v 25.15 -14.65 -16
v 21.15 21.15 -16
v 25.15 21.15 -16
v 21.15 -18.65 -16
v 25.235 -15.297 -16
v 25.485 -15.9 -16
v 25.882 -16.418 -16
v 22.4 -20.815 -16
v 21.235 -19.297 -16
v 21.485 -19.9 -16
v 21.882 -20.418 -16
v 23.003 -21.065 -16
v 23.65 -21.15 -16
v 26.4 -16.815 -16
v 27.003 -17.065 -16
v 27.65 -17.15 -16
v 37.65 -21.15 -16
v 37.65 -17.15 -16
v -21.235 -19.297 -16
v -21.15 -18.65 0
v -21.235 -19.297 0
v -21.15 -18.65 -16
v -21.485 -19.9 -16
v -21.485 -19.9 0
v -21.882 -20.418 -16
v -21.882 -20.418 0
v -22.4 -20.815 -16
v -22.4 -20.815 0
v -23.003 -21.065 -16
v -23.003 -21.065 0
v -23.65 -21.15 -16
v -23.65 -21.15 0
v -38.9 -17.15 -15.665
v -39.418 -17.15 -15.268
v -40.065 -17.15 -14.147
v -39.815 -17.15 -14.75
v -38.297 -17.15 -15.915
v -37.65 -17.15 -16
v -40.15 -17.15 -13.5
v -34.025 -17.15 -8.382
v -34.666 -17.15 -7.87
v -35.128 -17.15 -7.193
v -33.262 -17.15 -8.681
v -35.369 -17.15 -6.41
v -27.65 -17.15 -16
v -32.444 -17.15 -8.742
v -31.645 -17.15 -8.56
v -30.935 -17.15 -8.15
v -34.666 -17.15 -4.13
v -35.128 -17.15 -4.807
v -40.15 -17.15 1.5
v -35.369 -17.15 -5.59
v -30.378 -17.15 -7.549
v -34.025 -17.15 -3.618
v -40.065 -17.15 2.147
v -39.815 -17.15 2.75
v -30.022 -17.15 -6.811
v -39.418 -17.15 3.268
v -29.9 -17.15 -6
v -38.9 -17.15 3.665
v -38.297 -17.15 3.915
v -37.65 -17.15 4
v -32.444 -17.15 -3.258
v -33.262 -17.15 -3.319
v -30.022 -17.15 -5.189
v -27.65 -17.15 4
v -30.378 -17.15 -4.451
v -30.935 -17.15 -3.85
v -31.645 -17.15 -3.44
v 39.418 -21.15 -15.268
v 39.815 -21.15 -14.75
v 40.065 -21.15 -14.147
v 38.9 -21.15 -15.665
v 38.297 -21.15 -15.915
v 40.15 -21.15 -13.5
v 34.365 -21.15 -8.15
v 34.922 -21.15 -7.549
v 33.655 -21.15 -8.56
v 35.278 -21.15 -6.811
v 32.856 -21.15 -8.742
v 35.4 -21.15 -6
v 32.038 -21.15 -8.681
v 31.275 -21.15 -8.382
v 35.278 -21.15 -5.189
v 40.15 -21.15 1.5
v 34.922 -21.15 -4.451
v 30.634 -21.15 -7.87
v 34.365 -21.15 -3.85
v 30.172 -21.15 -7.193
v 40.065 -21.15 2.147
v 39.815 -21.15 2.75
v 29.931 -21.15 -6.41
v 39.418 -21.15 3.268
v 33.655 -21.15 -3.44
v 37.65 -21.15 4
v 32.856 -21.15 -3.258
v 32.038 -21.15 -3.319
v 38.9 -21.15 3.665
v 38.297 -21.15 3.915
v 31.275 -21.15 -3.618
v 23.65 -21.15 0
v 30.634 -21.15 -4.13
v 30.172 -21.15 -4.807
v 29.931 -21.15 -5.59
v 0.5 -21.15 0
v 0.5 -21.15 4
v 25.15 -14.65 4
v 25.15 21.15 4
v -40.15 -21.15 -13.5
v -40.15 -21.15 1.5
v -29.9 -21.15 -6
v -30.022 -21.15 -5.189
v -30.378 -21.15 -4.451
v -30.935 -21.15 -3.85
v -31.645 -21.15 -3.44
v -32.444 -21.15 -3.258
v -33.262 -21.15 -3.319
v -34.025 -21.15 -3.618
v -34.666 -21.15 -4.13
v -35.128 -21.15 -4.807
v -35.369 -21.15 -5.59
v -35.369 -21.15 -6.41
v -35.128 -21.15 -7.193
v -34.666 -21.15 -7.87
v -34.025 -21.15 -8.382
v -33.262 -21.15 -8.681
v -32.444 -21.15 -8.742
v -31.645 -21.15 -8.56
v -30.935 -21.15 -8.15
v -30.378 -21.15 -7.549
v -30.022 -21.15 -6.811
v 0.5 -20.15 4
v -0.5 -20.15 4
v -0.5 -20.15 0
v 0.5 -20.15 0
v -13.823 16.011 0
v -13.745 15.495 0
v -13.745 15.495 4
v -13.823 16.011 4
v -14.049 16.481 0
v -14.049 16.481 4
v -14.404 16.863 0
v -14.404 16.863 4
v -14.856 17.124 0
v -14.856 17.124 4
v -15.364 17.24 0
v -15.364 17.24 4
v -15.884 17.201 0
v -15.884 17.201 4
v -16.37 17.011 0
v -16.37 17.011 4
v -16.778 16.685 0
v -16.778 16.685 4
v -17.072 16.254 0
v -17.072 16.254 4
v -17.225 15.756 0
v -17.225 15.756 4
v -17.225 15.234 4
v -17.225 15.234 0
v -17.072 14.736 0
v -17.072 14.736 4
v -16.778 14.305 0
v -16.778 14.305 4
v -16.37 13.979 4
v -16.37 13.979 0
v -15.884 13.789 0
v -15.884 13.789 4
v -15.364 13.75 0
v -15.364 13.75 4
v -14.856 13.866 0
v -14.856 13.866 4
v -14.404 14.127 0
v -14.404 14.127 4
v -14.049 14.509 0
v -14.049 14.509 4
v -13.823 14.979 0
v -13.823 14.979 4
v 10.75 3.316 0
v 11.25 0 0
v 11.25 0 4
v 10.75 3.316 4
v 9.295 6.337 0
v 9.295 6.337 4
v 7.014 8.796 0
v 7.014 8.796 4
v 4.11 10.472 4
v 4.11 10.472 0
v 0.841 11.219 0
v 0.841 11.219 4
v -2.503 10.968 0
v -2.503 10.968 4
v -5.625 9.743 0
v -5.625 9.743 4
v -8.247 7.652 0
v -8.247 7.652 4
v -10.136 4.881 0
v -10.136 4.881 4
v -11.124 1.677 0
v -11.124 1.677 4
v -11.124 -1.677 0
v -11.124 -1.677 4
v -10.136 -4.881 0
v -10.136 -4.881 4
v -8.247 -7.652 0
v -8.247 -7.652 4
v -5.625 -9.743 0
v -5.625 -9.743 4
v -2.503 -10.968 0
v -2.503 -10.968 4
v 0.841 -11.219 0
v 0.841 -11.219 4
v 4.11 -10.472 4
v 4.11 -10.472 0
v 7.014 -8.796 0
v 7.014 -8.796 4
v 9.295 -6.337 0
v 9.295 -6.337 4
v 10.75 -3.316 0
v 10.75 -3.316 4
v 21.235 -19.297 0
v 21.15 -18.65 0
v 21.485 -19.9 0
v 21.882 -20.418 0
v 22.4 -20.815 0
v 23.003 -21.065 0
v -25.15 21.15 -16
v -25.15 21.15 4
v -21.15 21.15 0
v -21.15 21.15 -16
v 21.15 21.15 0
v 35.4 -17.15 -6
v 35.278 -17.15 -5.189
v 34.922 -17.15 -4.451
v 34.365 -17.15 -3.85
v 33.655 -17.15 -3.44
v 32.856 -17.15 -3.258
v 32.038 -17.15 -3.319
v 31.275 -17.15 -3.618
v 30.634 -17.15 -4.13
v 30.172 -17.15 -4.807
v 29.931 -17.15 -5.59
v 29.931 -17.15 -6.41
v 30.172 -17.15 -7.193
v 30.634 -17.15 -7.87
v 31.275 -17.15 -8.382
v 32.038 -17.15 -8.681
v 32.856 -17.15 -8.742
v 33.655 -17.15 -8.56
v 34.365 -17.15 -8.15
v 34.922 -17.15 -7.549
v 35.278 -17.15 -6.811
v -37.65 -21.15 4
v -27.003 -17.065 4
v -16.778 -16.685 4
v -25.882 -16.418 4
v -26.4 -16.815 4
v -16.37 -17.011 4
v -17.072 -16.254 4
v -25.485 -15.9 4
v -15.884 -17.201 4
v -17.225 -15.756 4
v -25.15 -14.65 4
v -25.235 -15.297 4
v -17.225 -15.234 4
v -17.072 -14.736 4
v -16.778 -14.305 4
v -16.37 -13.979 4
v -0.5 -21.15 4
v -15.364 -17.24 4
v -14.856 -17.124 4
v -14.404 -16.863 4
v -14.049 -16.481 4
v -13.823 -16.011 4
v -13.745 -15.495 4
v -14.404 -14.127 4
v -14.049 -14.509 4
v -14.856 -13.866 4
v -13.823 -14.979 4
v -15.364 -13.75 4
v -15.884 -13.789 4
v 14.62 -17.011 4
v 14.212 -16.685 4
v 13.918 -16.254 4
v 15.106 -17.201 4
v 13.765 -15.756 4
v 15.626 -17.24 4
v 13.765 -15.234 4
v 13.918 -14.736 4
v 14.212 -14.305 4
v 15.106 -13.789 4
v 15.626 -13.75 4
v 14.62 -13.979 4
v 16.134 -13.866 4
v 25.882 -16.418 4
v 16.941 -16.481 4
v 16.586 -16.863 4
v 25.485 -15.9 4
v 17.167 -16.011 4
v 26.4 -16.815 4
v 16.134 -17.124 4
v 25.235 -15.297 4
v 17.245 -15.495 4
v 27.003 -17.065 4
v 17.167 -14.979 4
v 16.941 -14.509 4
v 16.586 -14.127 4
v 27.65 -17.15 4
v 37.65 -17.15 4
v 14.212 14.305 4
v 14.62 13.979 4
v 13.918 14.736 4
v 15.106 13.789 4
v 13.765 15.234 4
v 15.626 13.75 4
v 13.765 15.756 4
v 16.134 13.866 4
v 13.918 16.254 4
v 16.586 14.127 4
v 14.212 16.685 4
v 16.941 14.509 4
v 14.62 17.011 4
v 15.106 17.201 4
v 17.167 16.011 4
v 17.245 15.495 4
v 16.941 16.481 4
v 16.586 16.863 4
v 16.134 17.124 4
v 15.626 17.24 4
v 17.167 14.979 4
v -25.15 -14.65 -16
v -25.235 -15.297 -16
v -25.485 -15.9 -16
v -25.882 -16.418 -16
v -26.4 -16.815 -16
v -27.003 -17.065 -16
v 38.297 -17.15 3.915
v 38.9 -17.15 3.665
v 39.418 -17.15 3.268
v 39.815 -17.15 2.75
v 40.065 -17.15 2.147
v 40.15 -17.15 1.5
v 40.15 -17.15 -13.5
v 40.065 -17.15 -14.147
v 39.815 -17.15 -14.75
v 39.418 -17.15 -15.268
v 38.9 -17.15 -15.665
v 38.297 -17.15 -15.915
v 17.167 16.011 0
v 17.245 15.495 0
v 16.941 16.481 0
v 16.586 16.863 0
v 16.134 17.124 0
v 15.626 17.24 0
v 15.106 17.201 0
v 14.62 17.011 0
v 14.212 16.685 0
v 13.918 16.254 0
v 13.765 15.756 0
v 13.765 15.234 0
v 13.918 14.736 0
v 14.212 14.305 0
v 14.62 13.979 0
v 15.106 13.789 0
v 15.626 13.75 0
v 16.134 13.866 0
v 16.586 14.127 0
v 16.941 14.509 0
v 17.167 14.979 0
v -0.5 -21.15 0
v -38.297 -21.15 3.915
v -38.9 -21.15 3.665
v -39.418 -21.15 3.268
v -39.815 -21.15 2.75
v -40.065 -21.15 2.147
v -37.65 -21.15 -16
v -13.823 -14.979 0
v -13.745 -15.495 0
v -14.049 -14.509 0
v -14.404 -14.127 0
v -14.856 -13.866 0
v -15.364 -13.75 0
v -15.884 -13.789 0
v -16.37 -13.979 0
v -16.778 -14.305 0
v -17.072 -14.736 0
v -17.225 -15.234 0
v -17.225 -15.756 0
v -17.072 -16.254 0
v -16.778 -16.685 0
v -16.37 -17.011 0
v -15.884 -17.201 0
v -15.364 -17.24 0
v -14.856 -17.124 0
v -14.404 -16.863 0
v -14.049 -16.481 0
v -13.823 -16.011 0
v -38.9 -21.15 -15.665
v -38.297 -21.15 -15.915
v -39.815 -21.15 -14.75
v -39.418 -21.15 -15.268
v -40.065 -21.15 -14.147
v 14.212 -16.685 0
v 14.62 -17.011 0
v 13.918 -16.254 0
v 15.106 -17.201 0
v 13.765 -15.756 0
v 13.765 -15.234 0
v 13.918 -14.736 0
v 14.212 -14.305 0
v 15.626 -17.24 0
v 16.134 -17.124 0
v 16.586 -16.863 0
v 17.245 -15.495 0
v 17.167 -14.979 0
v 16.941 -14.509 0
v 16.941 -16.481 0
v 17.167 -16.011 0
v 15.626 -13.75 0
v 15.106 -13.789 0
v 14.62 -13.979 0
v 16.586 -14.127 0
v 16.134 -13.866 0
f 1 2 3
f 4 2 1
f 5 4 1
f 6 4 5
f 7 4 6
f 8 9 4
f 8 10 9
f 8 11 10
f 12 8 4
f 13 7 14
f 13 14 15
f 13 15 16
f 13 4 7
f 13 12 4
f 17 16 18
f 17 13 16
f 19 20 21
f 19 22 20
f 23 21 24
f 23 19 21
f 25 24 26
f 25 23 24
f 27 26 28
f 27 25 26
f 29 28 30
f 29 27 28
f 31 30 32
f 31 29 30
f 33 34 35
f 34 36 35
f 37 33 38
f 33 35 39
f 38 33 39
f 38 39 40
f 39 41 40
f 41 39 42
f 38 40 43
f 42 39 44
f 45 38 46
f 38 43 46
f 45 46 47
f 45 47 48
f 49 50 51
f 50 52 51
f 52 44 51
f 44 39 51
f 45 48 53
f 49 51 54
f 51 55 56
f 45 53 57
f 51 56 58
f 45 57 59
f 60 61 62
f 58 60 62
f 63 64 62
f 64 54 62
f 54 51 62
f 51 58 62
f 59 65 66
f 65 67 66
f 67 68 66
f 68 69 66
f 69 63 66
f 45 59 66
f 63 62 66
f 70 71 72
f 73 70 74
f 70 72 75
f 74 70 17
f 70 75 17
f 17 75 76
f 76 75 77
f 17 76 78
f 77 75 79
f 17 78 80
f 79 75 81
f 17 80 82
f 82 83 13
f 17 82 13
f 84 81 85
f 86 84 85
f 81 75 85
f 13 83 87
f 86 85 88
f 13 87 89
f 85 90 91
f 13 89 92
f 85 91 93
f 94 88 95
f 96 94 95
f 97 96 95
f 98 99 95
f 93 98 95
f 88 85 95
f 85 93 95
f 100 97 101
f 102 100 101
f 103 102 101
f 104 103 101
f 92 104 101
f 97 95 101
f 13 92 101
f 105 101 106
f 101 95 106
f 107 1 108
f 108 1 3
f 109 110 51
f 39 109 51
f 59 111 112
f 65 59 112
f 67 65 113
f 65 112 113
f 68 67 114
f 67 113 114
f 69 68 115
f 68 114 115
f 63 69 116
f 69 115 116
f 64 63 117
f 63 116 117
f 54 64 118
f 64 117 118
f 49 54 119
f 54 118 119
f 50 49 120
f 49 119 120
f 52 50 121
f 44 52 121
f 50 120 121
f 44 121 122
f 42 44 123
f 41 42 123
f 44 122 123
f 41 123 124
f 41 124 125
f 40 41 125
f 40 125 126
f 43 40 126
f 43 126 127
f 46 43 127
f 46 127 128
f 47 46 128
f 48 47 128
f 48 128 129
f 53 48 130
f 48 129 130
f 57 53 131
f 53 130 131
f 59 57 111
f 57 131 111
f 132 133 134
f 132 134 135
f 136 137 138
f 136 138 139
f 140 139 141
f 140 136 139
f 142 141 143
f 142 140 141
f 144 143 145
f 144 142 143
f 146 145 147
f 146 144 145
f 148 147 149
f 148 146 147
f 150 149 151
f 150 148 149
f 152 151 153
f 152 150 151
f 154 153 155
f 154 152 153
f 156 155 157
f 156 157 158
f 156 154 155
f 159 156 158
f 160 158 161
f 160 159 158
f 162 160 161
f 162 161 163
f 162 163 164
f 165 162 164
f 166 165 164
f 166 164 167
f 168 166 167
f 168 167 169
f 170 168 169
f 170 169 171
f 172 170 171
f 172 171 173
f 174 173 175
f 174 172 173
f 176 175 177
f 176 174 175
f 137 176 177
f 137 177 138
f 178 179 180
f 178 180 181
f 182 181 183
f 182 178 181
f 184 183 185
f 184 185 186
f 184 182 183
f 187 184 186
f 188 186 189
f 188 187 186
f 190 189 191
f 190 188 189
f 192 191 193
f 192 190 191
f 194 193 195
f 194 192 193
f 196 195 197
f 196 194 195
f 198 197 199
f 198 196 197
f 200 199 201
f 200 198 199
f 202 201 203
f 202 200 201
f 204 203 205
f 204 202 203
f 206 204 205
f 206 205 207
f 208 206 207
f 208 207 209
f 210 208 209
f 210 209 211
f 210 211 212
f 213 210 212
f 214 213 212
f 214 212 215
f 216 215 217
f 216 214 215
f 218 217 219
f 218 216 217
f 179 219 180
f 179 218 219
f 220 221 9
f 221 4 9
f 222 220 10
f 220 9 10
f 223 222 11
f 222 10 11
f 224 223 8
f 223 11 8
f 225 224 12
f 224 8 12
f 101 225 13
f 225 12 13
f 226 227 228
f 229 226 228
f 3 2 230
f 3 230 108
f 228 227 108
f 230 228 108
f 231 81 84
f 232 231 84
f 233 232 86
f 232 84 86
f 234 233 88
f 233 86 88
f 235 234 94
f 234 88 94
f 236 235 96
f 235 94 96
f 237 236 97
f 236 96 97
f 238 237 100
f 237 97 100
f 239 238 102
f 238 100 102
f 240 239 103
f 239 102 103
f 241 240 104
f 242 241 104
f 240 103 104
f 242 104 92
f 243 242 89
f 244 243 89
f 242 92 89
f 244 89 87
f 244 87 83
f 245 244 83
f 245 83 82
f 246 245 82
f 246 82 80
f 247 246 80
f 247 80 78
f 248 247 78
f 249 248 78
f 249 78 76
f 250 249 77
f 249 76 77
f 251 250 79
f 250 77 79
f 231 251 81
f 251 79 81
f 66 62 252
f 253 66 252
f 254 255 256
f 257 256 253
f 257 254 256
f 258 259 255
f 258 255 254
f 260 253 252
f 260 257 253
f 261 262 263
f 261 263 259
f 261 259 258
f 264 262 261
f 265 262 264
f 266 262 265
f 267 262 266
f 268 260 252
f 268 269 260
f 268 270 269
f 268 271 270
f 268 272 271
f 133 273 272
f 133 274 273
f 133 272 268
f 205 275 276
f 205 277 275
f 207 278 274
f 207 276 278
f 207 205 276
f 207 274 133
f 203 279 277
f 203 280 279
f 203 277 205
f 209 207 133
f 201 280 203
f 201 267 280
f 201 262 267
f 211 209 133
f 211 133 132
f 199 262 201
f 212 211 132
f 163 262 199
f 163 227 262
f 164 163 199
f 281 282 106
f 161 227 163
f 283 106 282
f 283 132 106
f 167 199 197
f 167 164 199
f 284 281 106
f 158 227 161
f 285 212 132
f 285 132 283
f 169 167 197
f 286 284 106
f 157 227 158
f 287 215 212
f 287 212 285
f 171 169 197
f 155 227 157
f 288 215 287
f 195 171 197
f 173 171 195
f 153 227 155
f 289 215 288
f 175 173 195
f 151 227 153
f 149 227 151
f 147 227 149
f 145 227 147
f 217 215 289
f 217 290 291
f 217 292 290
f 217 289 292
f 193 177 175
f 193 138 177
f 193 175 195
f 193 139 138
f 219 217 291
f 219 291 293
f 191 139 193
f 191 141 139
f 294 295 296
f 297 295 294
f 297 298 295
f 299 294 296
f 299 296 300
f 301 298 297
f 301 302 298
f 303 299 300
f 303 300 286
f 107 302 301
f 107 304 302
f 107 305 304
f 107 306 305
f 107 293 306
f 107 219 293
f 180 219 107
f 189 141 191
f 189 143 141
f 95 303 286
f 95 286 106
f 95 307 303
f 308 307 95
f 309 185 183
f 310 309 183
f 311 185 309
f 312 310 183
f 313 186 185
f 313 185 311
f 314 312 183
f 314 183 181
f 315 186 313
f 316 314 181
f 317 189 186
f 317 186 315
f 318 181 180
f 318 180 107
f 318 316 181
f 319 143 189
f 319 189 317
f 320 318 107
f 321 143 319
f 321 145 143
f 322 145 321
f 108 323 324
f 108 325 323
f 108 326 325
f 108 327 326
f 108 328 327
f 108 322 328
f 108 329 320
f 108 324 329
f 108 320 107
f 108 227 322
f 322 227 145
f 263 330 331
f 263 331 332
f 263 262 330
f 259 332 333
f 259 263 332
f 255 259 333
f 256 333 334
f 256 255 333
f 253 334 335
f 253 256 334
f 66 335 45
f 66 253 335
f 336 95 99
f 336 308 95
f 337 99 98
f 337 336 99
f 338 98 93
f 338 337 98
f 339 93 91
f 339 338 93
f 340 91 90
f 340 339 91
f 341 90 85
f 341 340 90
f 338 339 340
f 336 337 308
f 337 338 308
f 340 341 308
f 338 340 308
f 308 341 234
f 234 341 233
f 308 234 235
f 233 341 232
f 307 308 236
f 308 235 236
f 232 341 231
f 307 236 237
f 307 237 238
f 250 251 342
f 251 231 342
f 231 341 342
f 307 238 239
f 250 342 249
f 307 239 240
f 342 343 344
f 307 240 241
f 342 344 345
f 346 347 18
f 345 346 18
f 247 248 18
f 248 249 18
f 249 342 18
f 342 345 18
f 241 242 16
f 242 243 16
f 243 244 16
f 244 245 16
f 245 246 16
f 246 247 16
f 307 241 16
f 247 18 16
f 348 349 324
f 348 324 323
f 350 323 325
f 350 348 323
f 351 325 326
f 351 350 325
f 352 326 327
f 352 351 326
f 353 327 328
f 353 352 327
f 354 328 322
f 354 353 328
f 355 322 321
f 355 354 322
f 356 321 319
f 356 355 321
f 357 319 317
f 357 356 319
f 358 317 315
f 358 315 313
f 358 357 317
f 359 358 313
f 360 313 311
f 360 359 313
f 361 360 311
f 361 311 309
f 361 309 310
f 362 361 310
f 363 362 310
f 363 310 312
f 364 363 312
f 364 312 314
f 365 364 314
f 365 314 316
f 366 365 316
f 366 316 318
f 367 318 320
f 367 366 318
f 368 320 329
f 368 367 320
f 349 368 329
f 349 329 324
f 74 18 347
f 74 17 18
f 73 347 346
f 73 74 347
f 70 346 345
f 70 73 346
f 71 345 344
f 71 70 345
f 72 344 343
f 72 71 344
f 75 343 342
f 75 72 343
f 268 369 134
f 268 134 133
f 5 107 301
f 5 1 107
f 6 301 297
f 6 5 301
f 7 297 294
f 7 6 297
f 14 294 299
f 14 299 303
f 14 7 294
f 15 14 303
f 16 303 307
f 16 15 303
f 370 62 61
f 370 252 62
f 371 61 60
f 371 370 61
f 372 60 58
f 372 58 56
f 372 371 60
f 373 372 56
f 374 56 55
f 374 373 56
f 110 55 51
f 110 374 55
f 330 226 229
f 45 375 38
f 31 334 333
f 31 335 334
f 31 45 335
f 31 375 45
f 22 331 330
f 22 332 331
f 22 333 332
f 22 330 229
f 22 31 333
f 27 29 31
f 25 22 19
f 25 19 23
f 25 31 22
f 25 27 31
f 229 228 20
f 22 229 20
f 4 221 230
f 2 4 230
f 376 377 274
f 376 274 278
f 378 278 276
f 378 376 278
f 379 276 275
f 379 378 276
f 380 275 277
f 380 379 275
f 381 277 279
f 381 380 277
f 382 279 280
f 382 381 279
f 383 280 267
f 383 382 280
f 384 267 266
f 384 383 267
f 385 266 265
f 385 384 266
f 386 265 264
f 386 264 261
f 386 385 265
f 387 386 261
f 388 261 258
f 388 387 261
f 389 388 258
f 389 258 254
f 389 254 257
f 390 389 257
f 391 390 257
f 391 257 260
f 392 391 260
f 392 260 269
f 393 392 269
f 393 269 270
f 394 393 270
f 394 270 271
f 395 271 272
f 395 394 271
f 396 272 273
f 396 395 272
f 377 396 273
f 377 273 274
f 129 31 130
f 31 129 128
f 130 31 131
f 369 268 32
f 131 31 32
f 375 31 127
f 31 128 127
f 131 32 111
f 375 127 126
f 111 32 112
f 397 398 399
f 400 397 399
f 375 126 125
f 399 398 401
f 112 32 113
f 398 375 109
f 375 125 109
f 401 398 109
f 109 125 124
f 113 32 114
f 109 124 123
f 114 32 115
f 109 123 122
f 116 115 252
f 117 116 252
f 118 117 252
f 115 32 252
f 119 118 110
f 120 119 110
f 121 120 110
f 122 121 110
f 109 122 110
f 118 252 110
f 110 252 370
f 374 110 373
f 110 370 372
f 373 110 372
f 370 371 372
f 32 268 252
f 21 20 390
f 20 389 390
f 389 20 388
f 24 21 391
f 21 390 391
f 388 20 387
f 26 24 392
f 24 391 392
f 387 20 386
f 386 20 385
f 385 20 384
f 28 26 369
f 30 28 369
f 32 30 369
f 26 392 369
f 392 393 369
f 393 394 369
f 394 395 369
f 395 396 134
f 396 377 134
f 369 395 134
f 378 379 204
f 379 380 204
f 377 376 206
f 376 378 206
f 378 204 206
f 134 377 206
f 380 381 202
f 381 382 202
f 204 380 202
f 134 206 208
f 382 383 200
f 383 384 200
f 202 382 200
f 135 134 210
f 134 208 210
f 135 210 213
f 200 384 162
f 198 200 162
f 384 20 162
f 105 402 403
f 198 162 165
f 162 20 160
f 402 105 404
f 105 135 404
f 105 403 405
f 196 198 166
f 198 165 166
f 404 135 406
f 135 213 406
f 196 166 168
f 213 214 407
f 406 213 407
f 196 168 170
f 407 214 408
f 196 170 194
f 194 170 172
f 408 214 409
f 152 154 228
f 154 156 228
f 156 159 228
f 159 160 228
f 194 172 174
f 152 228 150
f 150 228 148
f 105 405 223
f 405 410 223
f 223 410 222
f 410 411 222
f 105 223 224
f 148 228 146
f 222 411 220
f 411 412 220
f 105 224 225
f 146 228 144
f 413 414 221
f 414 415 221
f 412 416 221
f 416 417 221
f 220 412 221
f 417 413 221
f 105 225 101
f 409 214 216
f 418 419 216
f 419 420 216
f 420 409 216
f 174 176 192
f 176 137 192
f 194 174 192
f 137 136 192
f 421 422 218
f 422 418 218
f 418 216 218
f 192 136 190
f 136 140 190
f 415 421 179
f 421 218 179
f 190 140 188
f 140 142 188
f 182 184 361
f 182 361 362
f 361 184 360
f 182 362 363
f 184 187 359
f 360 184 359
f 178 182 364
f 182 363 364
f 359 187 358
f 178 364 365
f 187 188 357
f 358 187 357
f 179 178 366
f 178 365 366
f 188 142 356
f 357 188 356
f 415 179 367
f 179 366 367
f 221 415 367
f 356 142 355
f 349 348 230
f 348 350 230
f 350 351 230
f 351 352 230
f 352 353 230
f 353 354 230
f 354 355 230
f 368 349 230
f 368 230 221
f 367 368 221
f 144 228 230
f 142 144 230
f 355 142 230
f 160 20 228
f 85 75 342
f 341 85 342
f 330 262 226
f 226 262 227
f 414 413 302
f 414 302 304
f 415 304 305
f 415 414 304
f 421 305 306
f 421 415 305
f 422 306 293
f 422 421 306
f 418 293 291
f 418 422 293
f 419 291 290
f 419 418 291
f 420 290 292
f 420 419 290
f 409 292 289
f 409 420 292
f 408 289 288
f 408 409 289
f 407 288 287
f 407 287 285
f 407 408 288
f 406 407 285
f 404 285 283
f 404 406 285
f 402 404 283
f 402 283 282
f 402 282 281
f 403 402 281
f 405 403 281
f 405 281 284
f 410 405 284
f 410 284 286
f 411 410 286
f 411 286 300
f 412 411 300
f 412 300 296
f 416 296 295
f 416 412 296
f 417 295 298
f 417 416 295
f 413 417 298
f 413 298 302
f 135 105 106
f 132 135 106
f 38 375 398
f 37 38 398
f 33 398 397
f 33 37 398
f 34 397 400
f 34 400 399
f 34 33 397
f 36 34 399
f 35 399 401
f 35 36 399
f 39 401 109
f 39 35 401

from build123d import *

# Parameters (mm, degrees)
F0_W     = 4
F0_H     = 38.3
F0_R     = 1.75
F0_R_2   = 11.25
F1_DEPTH = 4
F3_DEPTH = 16
F4_R     = 2.75
F5_DEPTH = 4
F6_R     = 2.5
F7_W     = 0.5
F7_H     = 4
F8_DEPTH = 1


with BuildPart() as f1:
    # F0 (on Top) → F1 (new body)
    with BuildSketch(Plane.XY):
        with Locations((-23.15, 2)):
            Rectangle(F0_W, F0_H)
        Polygon((21.15, 21.15), (-21.15, 21.15), (-21.15, -17.15), (-21.15, -21.15), (21.15, -21.15), (21.15, -17.15), align=None)
        with Locations((-15.495, -15.495)):
            Circle(F0_R, mode=Mode.SUBTRACT)
        with Locations((15.495, -15.495)):
            Circle(F0_R, mode=Mode.SUBTRACT)
        with Locations((-15.495, 15.495)):
            Circle(F0_R, mode=Mode.SUBTRACT)
        Circle(F0_R_2, mode=Mode.SUBTRACT)
        with Locations((15.495, 15.495)):
            Circle(F0_R, mode=Mode.SUBTRACT)
        with Locations((23.15, 2)):
            Rectangle(F0_W, F0_H)
        Polygon((-21.15, -21.15), (-21.15, -17.15), (-25.15, -17.15), (-40.15, -17.15), (-40.15, -21.15), align=None)
        Polygon((25.15, -17.15), (21.15, -17.15), (21.15, -21.15), (40.15, -21.15), (40.15, -17.15), align=None)
    extrude(amount=F1_DEPTH)

    # F2 (on face) → F3 (join)
    with BuildSketch(Plane(origin=(0, 0, 0), x_dir=(1, 0, 0), z_dir=(0, 0, -1))):
        Polygon((-25.15, -21.15), (-21.15, -21.15), (-21.15, 17.15), (-21.15, 21.15), (-40.15, 21.15), (-40.15, 17.15), (-25.15, 17.15), align=None)
        Polygon((21.15, 17.15), (21.15, -21.15), (25.15, -21.15), (25.15, 17.15), (40.15, 17.15), (40.15, 21.15), (21.15, 21.15), align=None)
    extrude(amount=F3_DEPTH)

    # F4 (on face) → F5 (cut, through all)
    with BuildSketch(Plane.XZ.offset(21.15)):
        with Locations((-32.65, -6)):
            Circle(F4_R)
        with Locations((32.65, -6)):
            Circle(F4_R)
    extrude(amount=-F5_DEPTH, mode=Mode.SUBTRACT)

    # F6
    f6_edges = [f1.edges().sort_by_distance(p)[0] for p in [
        (-40.15, -19.15, 4),
        (-40.15, -19.15, -16),
        (40.15, -19.15, -16),
        (40.15, -19.15, 4),
        (25.15, -17.15, -6),
        (-25.15, -17.15, -6),
        (21.15, -21.15, -8),
        (-21.15, -21.15, -8),
    ]]
    fillet(f6_edges, radius=F6_R)

    # F7 (on face) → F8 (cut)
    with BuildSketch(Plane.XZ.offset(21.15)):
        with Locations((0.25, 2)):
            Rectangle(F7_W, F7_H)
        with Locations((-0.25, 2)):
            Rectangle(F7_W, F7_H)
    extrude(amount=-F8_DEPTH, mode=Mode.SUBTRACT)


solid = f1.part
